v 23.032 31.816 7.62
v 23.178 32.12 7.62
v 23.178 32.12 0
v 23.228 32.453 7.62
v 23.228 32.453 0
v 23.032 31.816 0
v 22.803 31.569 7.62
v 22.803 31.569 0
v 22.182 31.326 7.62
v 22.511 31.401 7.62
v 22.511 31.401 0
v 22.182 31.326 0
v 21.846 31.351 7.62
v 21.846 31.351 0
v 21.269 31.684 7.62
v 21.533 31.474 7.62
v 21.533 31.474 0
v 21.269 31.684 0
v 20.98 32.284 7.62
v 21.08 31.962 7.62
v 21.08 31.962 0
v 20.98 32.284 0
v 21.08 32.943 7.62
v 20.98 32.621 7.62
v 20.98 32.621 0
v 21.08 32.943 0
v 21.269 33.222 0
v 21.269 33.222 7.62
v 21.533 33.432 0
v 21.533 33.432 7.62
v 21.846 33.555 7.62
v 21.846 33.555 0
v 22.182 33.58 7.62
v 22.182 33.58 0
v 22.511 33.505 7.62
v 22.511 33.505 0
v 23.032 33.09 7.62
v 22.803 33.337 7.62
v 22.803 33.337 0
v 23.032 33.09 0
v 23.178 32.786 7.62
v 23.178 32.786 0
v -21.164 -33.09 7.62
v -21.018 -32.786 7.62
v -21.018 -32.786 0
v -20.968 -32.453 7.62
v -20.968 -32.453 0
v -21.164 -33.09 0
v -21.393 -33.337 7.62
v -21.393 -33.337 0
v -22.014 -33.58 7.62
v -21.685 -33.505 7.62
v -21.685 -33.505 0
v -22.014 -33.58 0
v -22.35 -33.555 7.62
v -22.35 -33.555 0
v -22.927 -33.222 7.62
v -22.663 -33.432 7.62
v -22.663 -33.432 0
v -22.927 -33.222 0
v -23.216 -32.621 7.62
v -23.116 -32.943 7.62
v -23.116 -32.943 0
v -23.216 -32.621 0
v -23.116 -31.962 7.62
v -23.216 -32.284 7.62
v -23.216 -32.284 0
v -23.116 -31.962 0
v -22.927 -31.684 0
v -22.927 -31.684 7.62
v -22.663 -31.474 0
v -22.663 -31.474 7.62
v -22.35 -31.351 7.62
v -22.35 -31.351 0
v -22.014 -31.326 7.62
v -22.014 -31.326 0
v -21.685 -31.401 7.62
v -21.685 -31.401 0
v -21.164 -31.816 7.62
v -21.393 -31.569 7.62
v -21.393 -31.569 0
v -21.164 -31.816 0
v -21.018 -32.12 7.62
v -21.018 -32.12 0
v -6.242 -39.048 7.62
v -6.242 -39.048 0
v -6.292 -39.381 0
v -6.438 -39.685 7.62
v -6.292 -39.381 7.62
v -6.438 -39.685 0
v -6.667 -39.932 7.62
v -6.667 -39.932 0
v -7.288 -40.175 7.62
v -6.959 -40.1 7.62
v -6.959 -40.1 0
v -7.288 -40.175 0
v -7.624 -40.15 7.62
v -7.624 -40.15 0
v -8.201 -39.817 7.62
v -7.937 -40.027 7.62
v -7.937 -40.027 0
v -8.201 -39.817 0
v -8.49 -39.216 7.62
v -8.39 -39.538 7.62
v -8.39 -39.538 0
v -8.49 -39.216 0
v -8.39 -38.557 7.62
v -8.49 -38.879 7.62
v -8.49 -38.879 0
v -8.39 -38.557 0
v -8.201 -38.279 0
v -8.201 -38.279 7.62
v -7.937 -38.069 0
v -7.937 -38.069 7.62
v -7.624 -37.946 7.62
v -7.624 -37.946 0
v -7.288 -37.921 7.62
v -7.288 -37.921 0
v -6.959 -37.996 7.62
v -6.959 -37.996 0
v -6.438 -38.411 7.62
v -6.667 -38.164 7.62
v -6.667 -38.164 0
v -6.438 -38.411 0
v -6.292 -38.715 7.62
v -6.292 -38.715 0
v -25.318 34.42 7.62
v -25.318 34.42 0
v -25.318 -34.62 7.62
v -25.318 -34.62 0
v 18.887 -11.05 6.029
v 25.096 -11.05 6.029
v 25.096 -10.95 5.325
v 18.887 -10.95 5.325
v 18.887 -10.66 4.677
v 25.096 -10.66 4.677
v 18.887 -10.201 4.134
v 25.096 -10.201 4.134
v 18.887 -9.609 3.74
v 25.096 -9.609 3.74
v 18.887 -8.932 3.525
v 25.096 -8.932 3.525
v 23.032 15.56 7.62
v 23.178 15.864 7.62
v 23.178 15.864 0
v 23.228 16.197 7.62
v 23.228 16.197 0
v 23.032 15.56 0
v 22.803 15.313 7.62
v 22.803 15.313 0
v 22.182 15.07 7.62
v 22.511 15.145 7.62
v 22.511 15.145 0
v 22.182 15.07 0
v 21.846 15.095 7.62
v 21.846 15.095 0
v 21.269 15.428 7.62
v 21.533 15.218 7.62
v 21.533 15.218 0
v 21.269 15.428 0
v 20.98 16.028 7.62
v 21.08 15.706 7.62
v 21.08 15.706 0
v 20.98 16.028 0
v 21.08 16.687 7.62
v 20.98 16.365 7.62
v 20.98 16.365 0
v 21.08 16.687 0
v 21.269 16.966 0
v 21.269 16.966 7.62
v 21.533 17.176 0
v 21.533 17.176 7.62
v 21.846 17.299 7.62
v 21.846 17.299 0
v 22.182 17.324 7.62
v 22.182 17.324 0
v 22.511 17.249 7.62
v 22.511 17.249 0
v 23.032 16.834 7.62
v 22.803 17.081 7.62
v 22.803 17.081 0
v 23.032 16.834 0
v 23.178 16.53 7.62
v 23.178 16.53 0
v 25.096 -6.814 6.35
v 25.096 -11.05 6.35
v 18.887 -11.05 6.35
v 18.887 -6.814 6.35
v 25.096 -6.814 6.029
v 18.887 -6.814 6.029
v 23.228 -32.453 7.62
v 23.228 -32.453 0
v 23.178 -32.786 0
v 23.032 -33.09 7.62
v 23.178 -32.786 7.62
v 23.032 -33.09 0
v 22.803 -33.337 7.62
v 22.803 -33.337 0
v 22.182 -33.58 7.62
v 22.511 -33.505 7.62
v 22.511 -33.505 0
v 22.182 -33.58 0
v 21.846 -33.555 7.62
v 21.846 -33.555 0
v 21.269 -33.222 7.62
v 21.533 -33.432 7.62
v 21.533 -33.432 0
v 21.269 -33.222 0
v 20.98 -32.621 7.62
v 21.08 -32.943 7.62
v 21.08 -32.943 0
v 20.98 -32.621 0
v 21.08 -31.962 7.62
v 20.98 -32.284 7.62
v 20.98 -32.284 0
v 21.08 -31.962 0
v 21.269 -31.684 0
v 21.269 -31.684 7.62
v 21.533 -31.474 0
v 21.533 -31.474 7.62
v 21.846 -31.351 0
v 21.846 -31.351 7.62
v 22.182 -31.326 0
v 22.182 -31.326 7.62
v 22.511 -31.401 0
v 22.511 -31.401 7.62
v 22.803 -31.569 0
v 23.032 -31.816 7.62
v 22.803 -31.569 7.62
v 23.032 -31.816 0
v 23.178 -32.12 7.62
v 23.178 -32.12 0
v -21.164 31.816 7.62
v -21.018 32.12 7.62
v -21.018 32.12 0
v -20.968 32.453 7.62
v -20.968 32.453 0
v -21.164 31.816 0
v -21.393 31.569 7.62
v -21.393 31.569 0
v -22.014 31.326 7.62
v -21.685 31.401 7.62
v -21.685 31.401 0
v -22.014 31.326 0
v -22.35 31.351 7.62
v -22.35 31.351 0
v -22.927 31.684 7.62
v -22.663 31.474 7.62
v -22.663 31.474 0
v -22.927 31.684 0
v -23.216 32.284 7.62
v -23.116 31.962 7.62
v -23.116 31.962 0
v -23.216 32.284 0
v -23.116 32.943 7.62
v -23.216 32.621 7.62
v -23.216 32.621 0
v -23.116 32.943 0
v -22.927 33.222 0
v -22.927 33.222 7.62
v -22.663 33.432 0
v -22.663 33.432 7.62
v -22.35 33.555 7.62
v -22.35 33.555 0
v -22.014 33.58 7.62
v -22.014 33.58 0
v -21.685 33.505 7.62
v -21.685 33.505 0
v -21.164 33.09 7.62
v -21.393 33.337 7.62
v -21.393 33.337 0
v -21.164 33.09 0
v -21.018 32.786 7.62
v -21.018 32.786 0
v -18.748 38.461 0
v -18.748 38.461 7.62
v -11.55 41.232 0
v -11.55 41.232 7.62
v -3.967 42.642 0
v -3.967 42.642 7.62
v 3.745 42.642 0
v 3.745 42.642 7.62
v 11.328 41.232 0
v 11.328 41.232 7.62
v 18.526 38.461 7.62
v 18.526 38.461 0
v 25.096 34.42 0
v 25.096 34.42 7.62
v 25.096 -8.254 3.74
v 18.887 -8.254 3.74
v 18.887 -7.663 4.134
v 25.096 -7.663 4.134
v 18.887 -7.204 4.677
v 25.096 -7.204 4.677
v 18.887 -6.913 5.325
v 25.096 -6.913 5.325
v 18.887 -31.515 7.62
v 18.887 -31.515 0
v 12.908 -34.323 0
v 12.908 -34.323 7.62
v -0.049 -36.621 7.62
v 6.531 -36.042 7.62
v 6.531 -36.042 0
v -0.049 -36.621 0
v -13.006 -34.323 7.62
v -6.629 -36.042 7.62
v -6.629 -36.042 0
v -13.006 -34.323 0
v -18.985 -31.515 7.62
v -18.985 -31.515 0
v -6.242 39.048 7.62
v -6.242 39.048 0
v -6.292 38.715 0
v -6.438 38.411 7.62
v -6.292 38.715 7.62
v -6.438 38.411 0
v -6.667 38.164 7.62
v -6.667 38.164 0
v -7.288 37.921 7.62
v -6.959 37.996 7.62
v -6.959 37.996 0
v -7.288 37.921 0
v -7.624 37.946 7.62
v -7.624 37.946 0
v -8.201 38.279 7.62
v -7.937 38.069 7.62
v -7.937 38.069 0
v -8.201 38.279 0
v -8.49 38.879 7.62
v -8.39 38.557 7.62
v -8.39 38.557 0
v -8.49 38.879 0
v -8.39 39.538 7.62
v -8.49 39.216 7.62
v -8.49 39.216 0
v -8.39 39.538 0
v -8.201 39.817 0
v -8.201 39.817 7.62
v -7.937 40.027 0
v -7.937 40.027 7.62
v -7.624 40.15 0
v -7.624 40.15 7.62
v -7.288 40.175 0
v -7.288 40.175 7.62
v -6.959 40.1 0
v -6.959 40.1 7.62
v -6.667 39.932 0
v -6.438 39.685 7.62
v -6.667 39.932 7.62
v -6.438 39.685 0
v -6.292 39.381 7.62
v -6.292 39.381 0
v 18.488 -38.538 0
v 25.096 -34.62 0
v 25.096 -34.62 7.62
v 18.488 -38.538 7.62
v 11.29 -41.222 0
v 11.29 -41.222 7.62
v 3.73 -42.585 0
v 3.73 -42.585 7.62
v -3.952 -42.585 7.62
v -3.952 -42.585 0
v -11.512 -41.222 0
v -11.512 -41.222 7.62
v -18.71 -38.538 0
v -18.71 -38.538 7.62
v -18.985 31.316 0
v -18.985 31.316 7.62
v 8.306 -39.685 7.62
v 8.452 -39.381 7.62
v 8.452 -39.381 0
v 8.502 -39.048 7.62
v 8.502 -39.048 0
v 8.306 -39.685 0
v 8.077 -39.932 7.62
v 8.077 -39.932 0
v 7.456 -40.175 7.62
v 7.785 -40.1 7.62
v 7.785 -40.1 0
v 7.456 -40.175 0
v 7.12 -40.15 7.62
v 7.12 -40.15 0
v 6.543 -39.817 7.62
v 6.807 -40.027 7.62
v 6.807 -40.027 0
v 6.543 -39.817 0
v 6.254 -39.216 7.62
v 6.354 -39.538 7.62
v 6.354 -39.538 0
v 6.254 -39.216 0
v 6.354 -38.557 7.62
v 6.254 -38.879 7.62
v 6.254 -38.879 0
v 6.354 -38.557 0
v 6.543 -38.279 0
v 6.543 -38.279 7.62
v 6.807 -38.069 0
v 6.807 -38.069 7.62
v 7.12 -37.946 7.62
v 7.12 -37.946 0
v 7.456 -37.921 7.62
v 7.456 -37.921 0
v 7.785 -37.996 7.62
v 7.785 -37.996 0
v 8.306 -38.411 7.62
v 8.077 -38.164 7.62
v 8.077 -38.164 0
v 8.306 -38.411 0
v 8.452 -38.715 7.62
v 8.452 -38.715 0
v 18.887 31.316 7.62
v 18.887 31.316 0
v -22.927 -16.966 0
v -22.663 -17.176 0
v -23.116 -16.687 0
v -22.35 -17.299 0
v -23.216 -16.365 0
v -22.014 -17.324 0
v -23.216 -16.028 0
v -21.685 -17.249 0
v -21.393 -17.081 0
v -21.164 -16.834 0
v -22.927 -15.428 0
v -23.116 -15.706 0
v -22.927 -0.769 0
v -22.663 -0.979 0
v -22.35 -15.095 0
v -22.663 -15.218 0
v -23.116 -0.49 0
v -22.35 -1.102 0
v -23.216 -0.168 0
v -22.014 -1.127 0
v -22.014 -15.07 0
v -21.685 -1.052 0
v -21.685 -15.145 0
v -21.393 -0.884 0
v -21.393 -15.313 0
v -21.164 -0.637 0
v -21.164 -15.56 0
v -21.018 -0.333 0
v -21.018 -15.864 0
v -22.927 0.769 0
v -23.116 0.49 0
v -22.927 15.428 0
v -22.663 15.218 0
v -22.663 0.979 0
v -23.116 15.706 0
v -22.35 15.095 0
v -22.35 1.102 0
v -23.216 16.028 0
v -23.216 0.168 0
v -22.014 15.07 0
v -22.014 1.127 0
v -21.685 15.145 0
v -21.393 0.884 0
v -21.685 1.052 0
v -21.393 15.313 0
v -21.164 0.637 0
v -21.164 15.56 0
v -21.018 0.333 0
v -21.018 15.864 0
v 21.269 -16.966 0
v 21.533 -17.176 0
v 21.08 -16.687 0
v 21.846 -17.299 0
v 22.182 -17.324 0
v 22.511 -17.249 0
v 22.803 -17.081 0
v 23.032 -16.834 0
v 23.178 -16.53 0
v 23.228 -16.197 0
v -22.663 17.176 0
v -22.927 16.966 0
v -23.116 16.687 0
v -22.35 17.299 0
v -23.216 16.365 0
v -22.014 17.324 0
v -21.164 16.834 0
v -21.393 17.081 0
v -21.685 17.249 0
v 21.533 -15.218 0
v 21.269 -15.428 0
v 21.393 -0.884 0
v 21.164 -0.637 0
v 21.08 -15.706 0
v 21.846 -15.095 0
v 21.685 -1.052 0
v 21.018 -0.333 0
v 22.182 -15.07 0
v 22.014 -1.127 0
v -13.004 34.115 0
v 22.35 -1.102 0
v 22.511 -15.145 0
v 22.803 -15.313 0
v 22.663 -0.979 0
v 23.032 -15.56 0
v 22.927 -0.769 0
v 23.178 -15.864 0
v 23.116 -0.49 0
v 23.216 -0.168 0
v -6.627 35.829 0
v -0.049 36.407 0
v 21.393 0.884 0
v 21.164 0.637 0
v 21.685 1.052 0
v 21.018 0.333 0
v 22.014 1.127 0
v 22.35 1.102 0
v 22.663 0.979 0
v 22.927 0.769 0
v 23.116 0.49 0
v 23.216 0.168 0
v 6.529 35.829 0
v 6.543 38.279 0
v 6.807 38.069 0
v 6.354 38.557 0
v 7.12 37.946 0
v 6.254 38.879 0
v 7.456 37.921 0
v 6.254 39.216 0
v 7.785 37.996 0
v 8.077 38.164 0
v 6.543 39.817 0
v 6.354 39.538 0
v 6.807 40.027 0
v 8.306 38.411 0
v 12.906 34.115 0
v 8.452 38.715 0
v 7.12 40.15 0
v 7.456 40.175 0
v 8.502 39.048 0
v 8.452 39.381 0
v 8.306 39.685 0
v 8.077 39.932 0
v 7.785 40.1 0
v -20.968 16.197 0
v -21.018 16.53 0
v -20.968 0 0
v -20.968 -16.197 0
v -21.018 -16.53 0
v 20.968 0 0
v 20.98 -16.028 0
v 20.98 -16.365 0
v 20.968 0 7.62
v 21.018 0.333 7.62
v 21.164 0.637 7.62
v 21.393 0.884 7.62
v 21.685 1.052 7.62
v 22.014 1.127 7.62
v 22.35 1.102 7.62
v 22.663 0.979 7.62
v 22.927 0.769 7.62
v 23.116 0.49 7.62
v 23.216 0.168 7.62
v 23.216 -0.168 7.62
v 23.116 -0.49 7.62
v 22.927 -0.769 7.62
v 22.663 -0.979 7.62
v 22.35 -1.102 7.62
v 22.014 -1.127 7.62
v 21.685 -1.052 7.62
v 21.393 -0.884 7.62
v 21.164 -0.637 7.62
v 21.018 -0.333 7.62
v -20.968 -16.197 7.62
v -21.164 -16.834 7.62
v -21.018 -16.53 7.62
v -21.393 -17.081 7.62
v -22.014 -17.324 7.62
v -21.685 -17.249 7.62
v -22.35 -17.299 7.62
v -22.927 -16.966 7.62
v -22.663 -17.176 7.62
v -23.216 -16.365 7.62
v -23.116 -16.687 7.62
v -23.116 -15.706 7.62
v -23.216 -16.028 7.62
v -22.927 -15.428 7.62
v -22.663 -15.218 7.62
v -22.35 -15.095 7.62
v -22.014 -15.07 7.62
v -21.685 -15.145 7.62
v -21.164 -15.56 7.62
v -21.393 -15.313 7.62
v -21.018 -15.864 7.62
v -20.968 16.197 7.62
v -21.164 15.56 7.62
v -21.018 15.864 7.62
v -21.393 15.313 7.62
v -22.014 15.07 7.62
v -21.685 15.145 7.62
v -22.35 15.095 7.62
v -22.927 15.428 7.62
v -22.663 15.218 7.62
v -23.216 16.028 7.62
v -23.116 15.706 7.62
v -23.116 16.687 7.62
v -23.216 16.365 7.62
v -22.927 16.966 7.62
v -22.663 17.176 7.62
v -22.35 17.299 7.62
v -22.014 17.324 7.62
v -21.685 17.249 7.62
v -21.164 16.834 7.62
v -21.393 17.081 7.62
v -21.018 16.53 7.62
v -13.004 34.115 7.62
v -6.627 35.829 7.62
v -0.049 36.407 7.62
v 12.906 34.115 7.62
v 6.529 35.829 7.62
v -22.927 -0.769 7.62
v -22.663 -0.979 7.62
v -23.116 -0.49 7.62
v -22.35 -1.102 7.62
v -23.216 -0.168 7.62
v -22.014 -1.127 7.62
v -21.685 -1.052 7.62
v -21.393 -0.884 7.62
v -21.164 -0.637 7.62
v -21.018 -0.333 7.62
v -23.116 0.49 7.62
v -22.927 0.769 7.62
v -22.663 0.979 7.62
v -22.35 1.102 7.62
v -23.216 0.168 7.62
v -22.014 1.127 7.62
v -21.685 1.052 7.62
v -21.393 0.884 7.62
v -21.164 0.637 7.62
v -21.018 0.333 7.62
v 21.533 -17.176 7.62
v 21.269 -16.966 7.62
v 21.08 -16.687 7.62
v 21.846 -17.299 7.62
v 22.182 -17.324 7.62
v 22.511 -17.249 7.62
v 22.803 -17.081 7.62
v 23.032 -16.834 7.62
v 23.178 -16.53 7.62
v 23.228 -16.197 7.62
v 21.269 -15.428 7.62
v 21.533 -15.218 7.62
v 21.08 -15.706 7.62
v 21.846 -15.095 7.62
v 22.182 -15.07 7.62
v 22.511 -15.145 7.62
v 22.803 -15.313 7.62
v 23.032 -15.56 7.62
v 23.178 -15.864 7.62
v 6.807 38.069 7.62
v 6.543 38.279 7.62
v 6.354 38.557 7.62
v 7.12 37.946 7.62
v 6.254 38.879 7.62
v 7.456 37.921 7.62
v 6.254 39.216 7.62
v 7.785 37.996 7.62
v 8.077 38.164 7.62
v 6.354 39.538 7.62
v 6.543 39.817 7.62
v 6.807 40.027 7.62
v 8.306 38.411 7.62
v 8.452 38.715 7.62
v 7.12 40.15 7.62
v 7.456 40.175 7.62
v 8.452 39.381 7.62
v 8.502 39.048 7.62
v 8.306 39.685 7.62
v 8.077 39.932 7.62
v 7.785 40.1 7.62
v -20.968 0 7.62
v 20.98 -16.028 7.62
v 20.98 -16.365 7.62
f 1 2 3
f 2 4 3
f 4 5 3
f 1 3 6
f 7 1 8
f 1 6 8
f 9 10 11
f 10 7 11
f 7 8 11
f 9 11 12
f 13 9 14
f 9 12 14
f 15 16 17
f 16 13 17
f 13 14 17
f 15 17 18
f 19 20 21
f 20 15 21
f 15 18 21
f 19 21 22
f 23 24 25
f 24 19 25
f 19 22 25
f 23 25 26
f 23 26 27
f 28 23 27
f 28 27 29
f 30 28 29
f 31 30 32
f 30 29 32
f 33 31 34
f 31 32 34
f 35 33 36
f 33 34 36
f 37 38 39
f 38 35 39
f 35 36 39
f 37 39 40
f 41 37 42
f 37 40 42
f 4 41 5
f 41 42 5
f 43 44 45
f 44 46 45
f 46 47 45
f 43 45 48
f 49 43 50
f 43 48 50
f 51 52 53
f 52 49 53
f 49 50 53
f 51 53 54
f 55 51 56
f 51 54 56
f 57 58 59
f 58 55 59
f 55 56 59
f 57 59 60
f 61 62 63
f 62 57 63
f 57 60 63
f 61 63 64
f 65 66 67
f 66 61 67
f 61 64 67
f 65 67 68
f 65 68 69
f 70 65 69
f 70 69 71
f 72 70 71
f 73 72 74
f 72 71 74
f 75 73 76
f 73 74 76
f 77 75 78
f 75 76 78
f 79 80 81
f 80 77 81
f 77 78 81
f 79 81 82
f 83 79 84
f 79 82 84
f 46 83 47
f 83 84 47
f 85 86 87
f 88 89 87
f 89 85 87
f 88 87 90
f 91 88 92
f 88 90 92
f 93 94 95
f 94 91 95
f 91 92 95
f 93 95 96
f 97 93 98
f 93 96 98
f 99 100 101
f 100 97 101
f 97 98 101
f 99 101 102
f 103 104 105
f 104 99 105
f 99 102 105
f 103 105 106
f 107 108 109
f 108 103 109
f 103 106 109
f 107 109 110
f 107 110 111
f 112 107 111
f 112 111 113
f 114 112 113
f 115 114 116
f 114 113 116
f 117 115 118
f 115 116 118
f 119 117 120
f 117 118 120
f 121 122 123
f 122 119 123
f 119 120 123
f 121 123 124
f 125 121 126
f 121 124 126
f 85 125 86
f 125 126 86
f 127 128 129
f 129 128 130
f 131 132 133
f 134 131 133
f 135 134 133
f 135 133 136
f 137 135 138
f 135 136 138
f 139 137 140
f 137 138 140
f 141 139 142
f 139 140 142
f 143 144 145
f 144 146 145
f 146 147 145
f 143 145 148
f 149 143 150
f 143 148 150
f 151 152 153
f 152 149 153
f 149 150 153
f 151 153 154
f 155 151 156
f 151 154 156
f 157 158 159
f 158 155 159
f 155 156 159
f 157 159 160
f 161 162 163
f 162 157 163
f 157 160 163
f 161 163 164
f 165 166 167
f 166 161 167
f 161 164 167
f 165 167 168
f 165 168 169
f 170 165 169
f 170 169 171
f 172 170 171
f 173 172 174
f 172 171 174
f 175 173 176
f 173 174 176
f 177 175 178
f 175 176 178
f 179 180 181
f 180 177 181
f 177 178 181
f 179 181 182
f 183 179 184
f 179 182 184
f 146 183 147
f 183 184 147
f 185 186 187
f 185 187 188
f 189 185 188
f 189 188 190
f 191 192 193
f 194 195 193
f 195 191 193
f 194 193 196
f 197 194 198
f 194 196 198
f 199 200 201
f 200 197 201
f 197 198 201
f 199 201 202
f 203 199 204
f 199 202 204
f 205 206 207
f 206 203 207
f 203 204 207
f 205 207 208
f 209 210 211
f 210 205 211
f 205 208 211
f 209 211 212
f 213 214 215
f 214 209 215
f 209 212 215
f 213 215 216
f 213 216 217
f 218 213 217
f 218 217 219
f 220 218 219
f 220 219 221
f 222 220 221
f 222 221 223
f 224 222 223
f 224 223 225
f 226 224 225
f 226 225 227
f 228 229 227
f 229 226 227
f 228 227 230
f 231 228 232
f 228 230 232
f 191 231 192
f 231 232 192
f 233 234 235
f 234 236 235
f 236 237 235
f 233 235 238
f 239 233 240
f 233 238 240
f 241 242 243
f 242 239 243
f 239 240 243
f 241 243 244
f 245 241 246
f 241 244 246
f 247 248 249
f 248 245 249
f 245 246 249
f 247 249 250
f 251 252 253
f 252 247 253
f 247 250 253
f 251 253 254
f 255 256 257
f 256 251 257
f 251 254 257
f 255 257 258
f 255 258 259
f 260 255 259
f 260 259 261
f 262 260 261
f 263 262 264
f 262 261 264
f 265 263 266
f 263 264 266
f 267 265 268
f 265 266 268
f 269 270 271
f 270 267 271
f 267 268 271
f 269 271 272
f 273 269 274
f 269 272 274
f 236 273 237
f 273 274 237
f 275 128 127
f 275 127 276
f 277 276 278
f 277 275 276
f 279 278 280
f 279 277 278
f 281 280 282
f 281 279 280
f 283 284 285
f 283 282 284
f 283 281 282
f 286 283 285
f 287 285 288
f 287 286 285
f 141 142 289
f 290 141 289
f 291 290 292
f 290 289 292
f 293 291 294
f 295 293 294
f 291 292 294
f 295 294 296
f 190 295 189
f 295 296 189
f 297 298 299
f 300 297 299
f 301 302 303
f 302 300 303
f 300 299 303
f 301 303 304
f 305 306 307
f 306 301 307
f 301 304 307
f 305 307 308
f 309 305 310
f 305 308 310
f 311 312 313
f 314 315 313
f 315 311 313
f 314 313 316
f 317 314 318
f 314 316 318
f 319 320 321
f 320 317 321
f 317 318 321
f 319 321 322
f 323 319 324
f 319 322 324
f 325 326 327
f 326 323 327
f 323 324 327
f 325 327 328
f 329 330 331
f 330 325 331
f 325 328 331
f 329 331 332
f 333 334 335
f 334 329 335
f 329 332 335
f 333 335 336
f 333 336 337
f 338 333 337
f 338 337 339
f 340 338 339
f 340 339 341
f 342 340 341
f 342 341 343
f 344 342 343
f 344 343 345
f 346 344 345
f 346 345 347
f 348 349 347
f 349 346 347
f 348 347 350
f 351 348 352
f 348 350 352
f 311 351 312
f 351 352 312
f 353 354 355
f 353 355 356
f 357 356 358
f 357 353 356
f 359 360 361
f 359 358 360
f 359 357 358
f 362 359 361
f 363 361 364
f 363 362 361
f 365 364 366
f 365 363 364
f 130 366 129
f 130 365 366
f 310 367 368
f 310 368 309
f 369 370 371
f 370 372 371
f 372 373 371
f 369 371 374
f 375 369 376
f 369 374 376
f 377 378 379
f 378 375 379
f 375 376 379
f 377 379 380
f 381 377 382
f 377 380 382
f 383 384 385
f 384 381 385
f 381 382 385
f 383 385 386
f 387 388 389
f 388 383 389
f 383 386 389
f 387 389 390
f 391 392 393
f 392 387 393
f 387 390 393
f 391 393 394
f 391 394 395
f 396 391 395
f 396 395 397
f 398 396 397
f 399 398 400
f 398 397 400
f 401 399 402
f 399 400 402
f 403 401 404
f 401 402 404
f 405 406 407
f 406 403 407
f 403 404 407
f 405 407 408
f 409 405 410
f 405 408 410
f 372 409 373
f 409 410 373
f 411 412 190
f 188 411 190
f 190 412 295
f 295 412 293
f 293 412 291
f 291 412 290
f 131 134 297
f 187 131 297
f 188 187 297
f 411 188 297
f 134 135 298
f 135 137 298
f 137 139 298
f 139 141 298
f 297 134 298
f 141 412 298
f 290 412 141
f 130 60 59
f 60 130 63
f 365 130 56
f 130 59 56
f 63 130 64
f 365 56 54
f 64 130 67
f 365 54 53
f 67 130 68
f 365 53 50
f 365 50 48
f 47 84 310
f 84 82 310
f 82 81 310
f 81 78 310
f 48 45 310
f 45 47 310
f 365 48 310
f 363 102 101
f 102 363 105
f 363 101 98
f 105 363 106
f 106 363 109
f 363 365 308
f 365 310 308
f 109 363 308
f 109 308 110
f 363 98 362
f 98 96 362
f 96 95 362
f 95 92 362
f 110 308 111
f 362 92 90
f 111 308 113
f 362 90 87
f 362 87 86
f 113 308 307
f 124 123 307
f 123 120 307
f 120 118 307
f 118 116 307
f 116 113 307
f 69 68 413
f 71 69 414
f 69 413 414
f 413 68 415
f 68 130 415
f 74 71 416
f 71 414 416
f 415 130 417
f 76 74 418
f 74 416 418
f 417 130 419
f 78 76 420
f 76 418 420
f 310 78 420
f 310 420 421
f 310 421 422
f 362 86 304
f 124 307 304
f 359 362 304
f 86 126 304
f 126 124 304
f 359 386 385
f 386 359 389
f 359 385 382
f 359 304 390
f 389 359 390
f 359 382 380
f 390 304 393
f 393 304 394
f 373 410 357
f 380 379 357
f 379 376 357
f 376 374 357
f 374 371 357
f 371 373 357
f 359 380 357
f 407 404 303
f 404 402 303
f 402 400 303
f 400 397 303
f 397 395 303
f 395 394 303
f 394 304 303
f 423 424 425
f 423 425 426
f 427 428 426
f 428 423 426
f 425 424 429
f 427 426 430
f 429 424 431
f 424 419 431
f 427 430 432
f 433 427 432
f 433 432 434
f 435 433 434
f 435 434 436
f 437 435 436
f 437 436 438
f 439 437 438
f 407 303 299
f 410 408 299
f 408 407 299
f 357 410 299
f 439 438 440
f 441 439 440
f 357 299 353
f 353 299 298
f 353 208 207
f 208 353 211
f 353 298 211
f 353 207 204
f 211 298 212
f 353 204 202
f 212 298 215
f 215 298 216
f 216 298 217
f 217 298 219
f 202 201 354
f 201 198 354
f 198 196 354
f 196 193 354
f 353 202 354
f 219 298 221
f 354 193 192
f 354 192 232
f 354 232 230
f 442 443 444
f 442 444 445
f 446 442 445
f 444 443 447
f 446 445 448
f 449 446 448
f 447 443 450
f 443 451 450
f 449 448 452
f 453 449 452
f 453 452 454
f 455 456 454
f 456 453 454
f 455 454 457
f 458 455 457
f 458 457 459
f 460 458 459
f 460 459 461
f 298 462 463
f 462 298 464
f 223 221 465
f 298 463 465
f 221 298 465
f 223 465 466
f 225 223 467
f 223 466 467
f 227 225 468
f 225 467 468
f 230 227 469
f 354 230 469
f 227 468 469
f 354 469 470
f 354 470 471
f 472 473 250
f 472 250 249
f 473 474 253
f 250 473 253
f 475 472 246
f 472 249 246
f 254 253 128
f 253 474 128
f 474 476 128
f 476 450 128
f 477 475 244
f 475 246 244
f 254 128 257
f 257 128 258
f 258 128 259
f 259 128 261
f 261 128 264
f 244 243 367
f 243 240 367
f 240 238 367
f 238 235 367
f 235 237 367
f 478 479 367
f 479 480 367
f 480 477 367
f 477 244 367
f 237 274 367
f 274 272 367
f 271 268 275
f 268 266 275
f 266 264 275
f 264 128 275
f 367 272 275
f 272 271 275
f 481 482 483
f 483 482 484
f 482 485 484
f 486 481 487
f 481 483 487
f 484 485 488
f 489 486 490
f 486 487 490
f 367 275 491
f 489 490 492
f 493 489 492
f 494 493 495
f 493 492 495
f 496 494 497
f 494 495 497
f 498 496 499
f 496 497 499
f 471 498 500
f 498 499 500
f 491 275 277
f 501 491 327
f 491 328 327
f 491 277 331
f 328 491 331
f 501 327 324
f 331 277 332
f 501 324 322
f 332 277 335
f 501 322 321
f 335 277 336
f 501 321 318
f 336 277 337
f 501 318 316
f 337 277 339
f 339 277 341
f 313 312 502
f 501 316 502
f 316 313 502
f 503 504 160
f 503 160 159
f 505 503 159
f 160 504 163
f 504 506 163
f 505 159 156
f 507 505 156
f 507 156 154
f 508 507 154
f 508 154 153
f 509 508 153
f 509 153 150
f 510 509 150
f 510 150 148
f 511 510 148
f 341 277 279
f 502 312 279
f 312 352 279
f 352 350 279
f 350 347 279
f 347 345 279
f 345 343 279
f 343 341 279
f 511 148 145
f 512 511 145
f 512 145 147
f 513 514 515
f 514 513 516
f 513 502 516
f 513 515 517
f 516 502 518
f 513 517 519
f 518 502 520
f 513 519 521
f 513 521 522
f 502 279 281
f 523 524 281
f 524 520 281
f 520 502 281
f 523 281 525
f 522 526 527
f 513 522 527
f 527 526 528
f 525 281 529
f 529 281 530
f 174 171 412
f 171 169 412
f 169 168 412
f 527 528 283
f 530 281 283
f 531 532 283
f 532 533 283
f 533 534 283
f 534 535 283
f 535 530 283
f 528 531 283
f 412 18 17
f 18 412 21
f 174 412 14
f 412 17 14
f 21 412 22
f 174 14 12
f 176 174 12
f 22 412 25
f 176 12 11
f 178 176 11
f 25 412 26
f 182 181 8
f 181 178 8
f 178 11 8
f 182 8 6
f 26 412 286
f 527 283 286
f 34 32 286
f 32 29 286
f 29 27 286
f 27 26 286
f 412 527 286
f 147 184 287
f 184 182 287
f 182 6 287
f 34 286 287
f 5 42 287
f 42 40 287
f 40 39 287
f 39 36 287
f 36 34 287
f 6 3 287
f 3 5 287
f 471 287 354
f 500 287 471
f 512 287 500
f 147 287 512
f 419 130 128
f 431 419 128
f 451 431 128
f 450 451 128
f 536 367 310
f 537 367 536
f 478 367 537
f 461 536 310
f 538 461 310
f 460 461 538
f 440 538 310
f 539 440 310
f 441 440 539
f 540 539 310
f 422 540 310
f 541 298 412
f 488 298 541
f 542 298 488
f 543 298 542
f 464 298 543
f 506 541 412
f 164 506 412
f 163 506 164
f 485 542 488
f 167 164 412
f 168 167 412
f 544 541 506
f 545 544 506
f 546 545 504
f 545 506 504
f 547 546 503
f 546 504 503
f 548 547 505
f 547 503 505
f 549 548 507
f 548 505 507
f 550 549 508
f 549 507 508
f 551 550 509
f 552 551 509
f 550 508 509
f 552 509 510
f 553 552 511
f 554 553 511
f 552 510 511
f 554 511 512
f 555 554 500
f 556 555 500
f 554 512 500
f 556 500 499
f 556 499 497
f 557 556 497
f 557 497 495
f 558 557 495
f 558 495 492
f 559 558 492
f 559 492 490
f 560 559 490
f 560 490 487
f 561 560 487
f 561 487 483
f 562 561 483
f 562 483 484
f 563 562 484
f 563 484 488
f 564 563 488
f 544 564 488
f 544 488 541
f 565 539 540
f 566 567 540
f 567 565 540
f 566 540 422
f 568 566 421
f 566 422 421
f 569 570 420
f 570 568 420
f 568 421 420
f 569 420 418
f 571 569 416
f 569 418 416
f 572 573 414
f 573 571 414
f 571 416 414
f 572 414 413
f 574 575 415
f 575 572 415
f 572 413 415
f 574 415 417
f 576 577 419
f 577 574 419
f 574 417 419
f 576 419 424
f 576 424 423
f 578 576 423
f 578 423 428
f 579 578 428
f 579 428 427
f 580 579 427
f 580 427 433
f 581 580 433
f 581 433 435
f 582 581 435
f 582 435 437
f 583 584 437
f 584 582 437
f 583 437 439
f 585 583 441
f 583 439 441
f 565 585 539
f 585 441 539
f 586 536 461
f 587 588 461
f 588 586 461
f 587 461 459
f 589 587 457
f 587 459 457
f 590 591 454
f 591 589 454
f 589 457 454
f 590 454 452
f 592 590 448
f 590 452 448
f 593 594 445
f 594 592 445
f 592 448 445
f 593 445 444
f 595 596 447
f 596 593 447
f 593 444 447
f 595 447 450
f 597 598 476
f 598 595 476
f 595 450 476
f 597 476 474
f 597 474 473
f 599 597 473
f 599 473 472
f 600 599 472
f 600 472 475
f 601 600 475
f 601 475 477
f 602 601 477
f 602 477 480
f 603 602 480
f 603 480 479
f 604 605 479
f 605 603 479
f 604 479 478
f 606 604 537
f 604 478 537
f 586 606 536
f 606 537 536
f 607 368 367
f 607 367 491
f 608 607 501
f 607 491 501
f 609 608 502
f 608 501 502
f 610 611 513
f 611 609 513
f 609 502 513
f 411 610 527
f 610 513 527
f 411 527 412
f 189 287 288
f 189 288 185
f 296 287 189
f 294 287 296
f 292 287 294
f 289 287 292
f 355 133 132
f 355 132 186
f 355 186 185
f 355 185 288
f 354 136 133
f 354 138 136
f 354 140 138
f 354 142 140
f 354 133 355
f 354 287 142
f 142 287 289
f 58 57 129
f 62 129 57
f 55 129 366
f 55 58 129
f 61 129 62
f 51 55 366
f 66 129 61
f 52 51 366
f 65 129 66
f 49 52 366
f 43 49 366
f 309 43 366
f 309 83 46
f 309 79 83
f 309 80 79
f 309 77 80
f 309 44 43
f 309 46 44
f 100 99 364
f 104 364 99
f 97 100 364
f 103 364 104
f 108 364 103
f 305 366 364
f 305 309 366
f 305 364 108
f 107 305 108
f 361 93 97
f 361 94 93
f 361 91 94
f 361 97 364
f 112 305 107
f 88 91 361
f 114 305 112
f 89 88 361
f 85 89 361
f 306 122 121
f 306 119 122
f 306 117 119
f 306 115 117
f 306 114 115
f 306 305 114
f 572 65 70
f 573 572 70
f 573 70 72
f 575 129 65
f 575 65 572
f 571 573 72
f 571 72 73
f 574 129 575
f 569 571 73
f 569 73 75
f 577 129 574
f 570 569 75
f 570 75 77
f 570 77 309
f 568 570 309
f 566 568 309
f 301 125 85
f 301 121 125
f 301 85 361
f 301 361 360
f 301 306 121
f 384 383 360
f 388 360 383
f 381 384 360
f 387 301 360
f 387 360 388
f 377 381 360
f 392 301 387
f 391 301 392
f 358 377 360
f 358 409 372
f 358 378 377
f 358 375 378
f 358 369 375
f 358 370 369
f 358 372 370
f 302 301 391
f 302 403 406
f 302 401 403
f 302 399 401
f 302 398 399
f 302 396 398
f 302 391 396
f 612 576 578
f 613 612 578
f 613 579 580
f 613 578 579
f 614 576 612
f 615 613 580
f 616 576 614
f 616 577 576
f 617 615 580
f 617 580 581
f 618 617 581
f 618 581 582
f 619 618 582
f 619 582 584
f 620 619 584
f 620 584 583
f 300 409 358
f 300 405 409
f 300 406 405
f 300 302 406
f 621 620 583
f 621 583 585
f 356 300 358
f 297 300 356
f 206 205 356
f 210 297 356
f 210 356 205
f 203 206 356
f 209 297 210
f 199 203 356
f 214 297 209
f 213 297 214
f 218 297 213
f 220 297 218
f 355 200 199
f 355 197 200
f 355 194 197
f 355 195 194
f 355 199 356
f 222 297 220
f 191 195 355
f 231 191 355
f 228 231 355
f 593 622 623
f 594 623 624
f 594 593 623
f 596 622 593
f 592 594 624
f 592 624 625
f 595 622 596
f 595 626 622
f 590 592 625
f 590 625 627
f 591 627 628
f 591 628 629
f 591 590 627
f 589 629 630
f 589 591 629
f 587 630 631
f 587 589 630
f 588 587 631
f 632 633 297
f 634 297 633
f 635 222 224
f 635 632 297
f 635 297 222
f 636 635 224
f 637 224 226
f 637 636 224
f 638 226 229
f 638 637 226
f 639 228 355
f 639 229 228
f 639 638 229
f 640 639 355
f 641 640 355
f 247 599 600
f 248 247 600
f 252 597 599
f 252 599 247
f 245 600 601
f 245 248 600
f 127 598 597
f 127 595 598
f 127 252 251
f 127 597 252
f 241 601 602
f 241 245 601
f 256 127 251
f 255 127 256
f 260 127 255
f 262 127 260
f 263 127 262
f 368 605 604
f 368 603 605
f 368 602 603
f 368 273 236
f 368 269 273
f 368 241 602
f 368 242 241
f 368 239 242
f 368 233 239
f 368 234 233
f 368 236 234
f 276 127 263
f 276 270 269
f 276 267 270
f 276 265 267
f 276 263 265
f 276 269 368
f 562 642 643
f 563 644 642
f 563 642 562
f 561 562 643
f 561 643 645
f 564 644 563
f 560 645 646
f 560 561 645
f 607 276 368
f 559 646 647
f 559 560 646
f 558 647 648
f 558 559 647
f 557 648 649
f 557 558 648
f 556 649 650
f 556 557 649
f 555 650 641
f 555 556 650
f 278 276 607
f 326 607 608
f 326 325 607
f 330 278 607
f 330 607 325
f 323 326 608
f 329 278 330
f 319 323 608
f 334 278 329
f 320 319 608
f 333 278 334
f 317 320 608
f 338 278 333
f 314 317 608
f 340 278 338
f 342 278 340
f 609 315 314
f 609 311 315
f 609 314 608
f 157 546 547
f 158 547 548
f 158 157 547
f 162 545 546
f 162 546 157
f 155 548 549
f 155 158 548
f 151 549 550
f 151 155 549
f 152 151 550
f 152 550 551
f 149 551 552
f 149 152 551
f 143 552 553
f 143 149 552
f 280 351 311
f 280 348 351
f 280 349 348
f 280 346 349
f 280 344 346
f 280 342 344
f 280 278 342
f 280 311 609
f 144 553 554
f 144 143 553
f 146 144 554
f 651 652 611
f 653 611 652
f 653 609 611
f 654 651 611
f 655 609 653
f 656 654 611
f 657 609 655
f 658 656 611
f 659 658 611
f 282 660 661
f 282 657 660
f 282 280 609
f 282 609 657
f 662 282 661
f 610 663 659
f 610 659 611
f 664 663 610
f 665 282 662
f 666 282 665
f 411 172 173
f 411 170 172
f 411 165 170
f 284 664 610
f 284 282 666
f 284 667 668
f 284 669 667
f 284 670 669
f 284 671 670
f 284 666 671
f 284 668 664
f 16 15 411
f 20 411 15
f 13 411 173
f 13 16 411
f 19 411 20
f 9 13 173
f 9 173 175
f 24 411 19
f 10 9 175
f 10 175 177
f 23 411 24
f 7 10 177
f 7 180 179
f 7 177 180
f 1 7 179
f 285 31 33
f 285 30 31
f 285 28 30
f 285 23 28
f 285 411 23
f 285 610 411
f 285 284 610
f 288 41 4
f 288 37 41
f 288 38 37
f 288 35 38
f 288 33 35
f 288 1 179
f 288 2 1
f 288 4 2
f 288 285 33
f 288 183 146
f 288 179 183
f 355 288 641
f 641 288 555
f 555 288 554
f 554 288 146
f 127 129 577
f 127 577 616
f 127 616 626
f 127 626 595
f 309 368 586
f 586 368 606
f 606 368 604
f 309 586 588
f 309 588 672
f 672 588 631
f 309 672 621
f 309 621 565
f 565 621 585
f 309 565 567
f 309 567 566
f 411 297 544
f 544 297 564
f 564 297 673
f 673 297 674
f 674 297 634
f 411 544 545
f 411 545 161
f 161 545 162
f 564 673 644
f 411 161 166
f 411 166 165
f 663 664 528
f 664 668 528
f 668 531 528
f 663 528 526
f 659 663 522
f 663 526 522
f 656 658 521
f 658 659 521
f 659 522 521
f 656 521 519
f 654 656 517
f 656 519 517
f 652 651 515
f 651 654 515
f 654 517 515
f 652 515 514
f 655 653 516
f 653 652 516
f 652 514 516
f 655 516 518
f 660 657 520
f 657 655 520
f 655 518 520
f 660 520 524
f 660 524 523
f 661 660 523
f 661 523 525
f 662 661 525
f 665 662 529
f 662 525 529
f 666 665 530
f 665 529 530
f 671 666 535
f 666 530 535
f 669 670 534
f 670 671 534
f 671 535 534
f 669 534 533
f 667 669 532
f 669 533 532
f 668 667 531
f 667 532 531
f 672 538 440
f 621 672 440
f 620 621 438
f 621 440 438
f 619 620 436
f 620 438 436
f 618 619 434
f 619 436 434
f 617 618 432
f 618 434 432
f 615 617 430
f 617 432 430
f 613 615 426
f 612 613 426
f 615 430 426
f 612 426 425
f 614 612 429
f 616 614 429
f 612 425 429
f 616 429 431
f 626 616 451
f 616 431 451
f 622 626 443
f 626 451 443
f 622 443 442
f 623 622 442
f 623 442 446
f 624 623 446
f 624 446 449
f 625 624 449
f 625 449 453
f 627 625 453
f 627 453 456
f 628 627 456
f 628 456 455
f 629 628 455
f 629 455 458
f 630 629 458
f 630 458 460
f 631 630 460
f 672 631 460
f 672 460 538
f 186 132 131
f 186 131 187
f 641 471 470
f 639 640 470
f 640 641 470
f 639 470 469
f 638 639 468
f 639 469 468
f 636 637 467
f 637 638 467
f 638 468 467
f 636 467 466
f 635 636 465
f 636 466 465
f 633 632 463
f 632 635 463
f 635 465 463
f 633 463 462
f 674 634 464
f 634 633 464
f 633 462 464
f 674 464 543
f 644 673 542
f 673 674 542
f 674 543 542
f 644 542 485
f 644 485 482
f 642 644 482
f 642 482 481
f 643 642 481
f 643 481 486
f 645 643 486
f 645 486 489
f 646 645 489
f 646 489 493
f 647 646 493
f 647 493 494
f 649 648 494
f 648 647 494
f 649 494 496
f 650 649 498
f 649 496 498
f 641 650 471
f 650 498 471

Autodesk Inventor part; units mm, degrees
ref_plane "YZ Plane" through (0, 0, 0) normal (1, 0, 0) x (0, 1, 0)
ref_plane "XZ Plane" through (0, 0, 0) normal (0, 1, 0) x (-1, 0, 0)
ref_plane "XY Plane" through (0, 0, 0) normal (0, 0, 1) x (1, 0, 0)
sketch "Sketch1" plane through (0, 0, 0) normal (0, 0, 1) x (1, 0, 0)
  arc A0 (25.273, 34.559) -> (0.0081, 42.8141) centre (0, 0) ccw
  line L0 (25.273, 34.559) -> (25.273, 0)
  line L1 (18.923, 0) -> (18.923, 31.5055)
  arc A1 (18.923, 31.5055) -> (0.0081, 36.4641) centre (-0.083, -2.439) ccw
  arc A2 (23.2283, 0) -> (20.9677, 0) centre (22.098, 0) ccw
  circle A3 centre (22.098, 32.4528) radius 1.1303
  circle A4 centre (22.098, 16.1968) radius 1.1303
  circle A5 centre (7.372, 39.0479) radius 1.1303
  arc A6 (-20.9677, 0) -> (-23.2283, 0) centre (-22.098, 0) ccw
  circle A7 centre (-22.098, 16.1968) radius 1.1303
  circle A8 centre (-22.098, 32.4528) radius 1.1303
  circle A9 centre (-7.372, 39.0479) radius 1.1303
  arc A10 (-0.0081, 36.4641) -> (-18.923, 31.5055) centre (0.083, -2.439) ccw
  arc A11 (-0.0081, 42.8141) -> (-25.273, 34.559) centre (0, 0) ccw
  line L2 (-25.273, 34.559) -> (-25.273, 0)
  line L3 (-18.923, 0) -> (-18.923, 31.5055)
  line L4 (25.273, -34.559) -> (25.273, 0)
  arc A12 (0.0081, -42.8141) -> (25.273, -34.559) centre (0, 0) ccw
  arc A13 (-25.273, -34.559) -> (-0.0081, -42.8141) centre (0, 0) ccw
  line L5 (-25.273, -34.559) -> (-25.273, 0)
  line L6 (-18.923, 0) -> (-18.923, -31.5055)
  arc A14 (-18.923, -31.5055) -> (-0.0081, -36.4641) centre (0.083, 2.439) ccw
  arc A15 (0.0081, -36.4641) -> (18.923, -31.5055) centre (-0.083, 2.439) ccw
  line L7 (18.923, 0) -> (18.923, -31.5055)
  arc A16 (-23.2283, 0) -> (-20.9677, 0) centre (-22.098, 0) ccw
  circle A17 centre (-22.098, -16.1968) radius 1.1303
  circle A18 centre (-22.098, -32.4528) radius 1.1303
  circle A19 centre (-7.372, -39.0479) radius 1.1303
  circle A20 centre (7.372, -39.0479) radius 1.1303
  circle A21 centre (22.098, -32.4528) radius 1.1303
  circle A22 centre (22.098, -16.1968) radius 1.1303
  arc A23 (20.9677, 0) -> (23.2283, 0) centre (22.098, 0) ccw
  point P0 (0, 29.76)
  point P1 (9.9838, 29.1027)
  point P2 (9.9839, 22.365)
  point P3 (9.9841, 15.6273)
  point P4 (9.9842, 8.8896)
  point P5 (9.9844, 2.1519)
  point P6 (-17.2373, 0)
  point P7 (-17.2389, 0)
  point P8 (-17.2362, -2.4348)
  point P9 (9.9845, -4.5858)
  point P10 (9.9847, -11.3235)
  point P11 (9.9848, -18.0612)
  point P12 (9.9849, -24.7989)
  point P13 (-0.4822, -30.8495)
  point P14 (0, -28.8424)
  point P15 (-10.2647, -28.1682)
  point P16 (-10.2649, -21.4305)
  point P17 (-10.265, -14.6929)
  point P18 (-10.2652, -7.9552)
  point P19 (-10.2653, -1.2175)
  point P20 (-10.2655, 5.5201)
  point P21 (-10.2656, 12.2578)
  point P22 (-10.2657, 18.9955)
  point P23 (-10.2659, 25.7332)
  point P24 (0.294, 31.7784)
  dimension "d1" = 6.35
  dimension "d2" = 2.2606
  dimension "d3" = 2.2606
  dimension "d4" = 2.2606
  dimension "d6" = 2.2606
sketch "Sketch4" plane through (0, 0, 0) normal (0, 0, 1) x (1, 0, 0)
  line L0 (-18.985, 31.3156) -> (-18.985, -31.5153)
  line L1 (18.8873, 31.3156) -> (18.8873, -31.5153)
  line L2 (-25.3178, 34.4199) -> (-25.3178, -34.6195)
  line L3 (25.0959, 34.4199) -> (25.0959, -34.6195)
  arc A0 (18.8873, 31.3156) -> (-18.985, 31.3156) centre (-0.0488, -1.3553) ccw
  arc A1 (-18.985, -31.5153) -> (18.8873, -31.5153) centre (-0.0488, 1.0453) ccw
  arc A2 (25.0959, 34.4199) -> (-25.3178, 34.4199) centre (-0.1109, 0.7967) ccw
  arc A3 (-25.3178, -34.6195) -> (25.0959, -34.6195) centre (-0.1109, 0.3555) ccw
  point P0 (0, 0)
extrude "Extrusion1" add sketch "Sketch4" along normal blind 7.62
extrude "Extrusion2" cut sketch "Sketch1" along normal blind 7.62
sketch "Sketch5" plane through (25.0959, -34.6195, 0) normal (1, 0, 0) x (0, 0, -1)
  line L0 (-7.62, 3.1043) -> (-7.62, 65.9351) projected
  line L1 (-6.35, 27.8057) -> (-6.0293, 27.8057)
  line L2 (-3.4893, 25.2657) -> (-3.4893, 26.1098)
  line L3 (-6.0293, 23.5698) -> (-6.35, 23.5698)
  line L4 (-6.35, 23.5698) -> (-6.35, 27.8057)
  arc A0 (-3.4893, 25.2657) -> (-6.0293, 27.8057) centre (-6.0293, 25.2657) ccw
  arc A1 (-6.0293, 23.5698) -> (-3.4893, 26.1098) centre (-6.0293, 26.1098) ccw
  point P0 (0, 34.6195)
  point P1 (-3.5246, 25.6877)
  dimension "d16" = 2.54
  dimension "d17" = 1.27
extrude "Extrusion3" cut sketch "Sketch5" against normal blind 12.7 contours L1 A0 A1 L3 L4
properties part number "new_retainer_full_cap"
